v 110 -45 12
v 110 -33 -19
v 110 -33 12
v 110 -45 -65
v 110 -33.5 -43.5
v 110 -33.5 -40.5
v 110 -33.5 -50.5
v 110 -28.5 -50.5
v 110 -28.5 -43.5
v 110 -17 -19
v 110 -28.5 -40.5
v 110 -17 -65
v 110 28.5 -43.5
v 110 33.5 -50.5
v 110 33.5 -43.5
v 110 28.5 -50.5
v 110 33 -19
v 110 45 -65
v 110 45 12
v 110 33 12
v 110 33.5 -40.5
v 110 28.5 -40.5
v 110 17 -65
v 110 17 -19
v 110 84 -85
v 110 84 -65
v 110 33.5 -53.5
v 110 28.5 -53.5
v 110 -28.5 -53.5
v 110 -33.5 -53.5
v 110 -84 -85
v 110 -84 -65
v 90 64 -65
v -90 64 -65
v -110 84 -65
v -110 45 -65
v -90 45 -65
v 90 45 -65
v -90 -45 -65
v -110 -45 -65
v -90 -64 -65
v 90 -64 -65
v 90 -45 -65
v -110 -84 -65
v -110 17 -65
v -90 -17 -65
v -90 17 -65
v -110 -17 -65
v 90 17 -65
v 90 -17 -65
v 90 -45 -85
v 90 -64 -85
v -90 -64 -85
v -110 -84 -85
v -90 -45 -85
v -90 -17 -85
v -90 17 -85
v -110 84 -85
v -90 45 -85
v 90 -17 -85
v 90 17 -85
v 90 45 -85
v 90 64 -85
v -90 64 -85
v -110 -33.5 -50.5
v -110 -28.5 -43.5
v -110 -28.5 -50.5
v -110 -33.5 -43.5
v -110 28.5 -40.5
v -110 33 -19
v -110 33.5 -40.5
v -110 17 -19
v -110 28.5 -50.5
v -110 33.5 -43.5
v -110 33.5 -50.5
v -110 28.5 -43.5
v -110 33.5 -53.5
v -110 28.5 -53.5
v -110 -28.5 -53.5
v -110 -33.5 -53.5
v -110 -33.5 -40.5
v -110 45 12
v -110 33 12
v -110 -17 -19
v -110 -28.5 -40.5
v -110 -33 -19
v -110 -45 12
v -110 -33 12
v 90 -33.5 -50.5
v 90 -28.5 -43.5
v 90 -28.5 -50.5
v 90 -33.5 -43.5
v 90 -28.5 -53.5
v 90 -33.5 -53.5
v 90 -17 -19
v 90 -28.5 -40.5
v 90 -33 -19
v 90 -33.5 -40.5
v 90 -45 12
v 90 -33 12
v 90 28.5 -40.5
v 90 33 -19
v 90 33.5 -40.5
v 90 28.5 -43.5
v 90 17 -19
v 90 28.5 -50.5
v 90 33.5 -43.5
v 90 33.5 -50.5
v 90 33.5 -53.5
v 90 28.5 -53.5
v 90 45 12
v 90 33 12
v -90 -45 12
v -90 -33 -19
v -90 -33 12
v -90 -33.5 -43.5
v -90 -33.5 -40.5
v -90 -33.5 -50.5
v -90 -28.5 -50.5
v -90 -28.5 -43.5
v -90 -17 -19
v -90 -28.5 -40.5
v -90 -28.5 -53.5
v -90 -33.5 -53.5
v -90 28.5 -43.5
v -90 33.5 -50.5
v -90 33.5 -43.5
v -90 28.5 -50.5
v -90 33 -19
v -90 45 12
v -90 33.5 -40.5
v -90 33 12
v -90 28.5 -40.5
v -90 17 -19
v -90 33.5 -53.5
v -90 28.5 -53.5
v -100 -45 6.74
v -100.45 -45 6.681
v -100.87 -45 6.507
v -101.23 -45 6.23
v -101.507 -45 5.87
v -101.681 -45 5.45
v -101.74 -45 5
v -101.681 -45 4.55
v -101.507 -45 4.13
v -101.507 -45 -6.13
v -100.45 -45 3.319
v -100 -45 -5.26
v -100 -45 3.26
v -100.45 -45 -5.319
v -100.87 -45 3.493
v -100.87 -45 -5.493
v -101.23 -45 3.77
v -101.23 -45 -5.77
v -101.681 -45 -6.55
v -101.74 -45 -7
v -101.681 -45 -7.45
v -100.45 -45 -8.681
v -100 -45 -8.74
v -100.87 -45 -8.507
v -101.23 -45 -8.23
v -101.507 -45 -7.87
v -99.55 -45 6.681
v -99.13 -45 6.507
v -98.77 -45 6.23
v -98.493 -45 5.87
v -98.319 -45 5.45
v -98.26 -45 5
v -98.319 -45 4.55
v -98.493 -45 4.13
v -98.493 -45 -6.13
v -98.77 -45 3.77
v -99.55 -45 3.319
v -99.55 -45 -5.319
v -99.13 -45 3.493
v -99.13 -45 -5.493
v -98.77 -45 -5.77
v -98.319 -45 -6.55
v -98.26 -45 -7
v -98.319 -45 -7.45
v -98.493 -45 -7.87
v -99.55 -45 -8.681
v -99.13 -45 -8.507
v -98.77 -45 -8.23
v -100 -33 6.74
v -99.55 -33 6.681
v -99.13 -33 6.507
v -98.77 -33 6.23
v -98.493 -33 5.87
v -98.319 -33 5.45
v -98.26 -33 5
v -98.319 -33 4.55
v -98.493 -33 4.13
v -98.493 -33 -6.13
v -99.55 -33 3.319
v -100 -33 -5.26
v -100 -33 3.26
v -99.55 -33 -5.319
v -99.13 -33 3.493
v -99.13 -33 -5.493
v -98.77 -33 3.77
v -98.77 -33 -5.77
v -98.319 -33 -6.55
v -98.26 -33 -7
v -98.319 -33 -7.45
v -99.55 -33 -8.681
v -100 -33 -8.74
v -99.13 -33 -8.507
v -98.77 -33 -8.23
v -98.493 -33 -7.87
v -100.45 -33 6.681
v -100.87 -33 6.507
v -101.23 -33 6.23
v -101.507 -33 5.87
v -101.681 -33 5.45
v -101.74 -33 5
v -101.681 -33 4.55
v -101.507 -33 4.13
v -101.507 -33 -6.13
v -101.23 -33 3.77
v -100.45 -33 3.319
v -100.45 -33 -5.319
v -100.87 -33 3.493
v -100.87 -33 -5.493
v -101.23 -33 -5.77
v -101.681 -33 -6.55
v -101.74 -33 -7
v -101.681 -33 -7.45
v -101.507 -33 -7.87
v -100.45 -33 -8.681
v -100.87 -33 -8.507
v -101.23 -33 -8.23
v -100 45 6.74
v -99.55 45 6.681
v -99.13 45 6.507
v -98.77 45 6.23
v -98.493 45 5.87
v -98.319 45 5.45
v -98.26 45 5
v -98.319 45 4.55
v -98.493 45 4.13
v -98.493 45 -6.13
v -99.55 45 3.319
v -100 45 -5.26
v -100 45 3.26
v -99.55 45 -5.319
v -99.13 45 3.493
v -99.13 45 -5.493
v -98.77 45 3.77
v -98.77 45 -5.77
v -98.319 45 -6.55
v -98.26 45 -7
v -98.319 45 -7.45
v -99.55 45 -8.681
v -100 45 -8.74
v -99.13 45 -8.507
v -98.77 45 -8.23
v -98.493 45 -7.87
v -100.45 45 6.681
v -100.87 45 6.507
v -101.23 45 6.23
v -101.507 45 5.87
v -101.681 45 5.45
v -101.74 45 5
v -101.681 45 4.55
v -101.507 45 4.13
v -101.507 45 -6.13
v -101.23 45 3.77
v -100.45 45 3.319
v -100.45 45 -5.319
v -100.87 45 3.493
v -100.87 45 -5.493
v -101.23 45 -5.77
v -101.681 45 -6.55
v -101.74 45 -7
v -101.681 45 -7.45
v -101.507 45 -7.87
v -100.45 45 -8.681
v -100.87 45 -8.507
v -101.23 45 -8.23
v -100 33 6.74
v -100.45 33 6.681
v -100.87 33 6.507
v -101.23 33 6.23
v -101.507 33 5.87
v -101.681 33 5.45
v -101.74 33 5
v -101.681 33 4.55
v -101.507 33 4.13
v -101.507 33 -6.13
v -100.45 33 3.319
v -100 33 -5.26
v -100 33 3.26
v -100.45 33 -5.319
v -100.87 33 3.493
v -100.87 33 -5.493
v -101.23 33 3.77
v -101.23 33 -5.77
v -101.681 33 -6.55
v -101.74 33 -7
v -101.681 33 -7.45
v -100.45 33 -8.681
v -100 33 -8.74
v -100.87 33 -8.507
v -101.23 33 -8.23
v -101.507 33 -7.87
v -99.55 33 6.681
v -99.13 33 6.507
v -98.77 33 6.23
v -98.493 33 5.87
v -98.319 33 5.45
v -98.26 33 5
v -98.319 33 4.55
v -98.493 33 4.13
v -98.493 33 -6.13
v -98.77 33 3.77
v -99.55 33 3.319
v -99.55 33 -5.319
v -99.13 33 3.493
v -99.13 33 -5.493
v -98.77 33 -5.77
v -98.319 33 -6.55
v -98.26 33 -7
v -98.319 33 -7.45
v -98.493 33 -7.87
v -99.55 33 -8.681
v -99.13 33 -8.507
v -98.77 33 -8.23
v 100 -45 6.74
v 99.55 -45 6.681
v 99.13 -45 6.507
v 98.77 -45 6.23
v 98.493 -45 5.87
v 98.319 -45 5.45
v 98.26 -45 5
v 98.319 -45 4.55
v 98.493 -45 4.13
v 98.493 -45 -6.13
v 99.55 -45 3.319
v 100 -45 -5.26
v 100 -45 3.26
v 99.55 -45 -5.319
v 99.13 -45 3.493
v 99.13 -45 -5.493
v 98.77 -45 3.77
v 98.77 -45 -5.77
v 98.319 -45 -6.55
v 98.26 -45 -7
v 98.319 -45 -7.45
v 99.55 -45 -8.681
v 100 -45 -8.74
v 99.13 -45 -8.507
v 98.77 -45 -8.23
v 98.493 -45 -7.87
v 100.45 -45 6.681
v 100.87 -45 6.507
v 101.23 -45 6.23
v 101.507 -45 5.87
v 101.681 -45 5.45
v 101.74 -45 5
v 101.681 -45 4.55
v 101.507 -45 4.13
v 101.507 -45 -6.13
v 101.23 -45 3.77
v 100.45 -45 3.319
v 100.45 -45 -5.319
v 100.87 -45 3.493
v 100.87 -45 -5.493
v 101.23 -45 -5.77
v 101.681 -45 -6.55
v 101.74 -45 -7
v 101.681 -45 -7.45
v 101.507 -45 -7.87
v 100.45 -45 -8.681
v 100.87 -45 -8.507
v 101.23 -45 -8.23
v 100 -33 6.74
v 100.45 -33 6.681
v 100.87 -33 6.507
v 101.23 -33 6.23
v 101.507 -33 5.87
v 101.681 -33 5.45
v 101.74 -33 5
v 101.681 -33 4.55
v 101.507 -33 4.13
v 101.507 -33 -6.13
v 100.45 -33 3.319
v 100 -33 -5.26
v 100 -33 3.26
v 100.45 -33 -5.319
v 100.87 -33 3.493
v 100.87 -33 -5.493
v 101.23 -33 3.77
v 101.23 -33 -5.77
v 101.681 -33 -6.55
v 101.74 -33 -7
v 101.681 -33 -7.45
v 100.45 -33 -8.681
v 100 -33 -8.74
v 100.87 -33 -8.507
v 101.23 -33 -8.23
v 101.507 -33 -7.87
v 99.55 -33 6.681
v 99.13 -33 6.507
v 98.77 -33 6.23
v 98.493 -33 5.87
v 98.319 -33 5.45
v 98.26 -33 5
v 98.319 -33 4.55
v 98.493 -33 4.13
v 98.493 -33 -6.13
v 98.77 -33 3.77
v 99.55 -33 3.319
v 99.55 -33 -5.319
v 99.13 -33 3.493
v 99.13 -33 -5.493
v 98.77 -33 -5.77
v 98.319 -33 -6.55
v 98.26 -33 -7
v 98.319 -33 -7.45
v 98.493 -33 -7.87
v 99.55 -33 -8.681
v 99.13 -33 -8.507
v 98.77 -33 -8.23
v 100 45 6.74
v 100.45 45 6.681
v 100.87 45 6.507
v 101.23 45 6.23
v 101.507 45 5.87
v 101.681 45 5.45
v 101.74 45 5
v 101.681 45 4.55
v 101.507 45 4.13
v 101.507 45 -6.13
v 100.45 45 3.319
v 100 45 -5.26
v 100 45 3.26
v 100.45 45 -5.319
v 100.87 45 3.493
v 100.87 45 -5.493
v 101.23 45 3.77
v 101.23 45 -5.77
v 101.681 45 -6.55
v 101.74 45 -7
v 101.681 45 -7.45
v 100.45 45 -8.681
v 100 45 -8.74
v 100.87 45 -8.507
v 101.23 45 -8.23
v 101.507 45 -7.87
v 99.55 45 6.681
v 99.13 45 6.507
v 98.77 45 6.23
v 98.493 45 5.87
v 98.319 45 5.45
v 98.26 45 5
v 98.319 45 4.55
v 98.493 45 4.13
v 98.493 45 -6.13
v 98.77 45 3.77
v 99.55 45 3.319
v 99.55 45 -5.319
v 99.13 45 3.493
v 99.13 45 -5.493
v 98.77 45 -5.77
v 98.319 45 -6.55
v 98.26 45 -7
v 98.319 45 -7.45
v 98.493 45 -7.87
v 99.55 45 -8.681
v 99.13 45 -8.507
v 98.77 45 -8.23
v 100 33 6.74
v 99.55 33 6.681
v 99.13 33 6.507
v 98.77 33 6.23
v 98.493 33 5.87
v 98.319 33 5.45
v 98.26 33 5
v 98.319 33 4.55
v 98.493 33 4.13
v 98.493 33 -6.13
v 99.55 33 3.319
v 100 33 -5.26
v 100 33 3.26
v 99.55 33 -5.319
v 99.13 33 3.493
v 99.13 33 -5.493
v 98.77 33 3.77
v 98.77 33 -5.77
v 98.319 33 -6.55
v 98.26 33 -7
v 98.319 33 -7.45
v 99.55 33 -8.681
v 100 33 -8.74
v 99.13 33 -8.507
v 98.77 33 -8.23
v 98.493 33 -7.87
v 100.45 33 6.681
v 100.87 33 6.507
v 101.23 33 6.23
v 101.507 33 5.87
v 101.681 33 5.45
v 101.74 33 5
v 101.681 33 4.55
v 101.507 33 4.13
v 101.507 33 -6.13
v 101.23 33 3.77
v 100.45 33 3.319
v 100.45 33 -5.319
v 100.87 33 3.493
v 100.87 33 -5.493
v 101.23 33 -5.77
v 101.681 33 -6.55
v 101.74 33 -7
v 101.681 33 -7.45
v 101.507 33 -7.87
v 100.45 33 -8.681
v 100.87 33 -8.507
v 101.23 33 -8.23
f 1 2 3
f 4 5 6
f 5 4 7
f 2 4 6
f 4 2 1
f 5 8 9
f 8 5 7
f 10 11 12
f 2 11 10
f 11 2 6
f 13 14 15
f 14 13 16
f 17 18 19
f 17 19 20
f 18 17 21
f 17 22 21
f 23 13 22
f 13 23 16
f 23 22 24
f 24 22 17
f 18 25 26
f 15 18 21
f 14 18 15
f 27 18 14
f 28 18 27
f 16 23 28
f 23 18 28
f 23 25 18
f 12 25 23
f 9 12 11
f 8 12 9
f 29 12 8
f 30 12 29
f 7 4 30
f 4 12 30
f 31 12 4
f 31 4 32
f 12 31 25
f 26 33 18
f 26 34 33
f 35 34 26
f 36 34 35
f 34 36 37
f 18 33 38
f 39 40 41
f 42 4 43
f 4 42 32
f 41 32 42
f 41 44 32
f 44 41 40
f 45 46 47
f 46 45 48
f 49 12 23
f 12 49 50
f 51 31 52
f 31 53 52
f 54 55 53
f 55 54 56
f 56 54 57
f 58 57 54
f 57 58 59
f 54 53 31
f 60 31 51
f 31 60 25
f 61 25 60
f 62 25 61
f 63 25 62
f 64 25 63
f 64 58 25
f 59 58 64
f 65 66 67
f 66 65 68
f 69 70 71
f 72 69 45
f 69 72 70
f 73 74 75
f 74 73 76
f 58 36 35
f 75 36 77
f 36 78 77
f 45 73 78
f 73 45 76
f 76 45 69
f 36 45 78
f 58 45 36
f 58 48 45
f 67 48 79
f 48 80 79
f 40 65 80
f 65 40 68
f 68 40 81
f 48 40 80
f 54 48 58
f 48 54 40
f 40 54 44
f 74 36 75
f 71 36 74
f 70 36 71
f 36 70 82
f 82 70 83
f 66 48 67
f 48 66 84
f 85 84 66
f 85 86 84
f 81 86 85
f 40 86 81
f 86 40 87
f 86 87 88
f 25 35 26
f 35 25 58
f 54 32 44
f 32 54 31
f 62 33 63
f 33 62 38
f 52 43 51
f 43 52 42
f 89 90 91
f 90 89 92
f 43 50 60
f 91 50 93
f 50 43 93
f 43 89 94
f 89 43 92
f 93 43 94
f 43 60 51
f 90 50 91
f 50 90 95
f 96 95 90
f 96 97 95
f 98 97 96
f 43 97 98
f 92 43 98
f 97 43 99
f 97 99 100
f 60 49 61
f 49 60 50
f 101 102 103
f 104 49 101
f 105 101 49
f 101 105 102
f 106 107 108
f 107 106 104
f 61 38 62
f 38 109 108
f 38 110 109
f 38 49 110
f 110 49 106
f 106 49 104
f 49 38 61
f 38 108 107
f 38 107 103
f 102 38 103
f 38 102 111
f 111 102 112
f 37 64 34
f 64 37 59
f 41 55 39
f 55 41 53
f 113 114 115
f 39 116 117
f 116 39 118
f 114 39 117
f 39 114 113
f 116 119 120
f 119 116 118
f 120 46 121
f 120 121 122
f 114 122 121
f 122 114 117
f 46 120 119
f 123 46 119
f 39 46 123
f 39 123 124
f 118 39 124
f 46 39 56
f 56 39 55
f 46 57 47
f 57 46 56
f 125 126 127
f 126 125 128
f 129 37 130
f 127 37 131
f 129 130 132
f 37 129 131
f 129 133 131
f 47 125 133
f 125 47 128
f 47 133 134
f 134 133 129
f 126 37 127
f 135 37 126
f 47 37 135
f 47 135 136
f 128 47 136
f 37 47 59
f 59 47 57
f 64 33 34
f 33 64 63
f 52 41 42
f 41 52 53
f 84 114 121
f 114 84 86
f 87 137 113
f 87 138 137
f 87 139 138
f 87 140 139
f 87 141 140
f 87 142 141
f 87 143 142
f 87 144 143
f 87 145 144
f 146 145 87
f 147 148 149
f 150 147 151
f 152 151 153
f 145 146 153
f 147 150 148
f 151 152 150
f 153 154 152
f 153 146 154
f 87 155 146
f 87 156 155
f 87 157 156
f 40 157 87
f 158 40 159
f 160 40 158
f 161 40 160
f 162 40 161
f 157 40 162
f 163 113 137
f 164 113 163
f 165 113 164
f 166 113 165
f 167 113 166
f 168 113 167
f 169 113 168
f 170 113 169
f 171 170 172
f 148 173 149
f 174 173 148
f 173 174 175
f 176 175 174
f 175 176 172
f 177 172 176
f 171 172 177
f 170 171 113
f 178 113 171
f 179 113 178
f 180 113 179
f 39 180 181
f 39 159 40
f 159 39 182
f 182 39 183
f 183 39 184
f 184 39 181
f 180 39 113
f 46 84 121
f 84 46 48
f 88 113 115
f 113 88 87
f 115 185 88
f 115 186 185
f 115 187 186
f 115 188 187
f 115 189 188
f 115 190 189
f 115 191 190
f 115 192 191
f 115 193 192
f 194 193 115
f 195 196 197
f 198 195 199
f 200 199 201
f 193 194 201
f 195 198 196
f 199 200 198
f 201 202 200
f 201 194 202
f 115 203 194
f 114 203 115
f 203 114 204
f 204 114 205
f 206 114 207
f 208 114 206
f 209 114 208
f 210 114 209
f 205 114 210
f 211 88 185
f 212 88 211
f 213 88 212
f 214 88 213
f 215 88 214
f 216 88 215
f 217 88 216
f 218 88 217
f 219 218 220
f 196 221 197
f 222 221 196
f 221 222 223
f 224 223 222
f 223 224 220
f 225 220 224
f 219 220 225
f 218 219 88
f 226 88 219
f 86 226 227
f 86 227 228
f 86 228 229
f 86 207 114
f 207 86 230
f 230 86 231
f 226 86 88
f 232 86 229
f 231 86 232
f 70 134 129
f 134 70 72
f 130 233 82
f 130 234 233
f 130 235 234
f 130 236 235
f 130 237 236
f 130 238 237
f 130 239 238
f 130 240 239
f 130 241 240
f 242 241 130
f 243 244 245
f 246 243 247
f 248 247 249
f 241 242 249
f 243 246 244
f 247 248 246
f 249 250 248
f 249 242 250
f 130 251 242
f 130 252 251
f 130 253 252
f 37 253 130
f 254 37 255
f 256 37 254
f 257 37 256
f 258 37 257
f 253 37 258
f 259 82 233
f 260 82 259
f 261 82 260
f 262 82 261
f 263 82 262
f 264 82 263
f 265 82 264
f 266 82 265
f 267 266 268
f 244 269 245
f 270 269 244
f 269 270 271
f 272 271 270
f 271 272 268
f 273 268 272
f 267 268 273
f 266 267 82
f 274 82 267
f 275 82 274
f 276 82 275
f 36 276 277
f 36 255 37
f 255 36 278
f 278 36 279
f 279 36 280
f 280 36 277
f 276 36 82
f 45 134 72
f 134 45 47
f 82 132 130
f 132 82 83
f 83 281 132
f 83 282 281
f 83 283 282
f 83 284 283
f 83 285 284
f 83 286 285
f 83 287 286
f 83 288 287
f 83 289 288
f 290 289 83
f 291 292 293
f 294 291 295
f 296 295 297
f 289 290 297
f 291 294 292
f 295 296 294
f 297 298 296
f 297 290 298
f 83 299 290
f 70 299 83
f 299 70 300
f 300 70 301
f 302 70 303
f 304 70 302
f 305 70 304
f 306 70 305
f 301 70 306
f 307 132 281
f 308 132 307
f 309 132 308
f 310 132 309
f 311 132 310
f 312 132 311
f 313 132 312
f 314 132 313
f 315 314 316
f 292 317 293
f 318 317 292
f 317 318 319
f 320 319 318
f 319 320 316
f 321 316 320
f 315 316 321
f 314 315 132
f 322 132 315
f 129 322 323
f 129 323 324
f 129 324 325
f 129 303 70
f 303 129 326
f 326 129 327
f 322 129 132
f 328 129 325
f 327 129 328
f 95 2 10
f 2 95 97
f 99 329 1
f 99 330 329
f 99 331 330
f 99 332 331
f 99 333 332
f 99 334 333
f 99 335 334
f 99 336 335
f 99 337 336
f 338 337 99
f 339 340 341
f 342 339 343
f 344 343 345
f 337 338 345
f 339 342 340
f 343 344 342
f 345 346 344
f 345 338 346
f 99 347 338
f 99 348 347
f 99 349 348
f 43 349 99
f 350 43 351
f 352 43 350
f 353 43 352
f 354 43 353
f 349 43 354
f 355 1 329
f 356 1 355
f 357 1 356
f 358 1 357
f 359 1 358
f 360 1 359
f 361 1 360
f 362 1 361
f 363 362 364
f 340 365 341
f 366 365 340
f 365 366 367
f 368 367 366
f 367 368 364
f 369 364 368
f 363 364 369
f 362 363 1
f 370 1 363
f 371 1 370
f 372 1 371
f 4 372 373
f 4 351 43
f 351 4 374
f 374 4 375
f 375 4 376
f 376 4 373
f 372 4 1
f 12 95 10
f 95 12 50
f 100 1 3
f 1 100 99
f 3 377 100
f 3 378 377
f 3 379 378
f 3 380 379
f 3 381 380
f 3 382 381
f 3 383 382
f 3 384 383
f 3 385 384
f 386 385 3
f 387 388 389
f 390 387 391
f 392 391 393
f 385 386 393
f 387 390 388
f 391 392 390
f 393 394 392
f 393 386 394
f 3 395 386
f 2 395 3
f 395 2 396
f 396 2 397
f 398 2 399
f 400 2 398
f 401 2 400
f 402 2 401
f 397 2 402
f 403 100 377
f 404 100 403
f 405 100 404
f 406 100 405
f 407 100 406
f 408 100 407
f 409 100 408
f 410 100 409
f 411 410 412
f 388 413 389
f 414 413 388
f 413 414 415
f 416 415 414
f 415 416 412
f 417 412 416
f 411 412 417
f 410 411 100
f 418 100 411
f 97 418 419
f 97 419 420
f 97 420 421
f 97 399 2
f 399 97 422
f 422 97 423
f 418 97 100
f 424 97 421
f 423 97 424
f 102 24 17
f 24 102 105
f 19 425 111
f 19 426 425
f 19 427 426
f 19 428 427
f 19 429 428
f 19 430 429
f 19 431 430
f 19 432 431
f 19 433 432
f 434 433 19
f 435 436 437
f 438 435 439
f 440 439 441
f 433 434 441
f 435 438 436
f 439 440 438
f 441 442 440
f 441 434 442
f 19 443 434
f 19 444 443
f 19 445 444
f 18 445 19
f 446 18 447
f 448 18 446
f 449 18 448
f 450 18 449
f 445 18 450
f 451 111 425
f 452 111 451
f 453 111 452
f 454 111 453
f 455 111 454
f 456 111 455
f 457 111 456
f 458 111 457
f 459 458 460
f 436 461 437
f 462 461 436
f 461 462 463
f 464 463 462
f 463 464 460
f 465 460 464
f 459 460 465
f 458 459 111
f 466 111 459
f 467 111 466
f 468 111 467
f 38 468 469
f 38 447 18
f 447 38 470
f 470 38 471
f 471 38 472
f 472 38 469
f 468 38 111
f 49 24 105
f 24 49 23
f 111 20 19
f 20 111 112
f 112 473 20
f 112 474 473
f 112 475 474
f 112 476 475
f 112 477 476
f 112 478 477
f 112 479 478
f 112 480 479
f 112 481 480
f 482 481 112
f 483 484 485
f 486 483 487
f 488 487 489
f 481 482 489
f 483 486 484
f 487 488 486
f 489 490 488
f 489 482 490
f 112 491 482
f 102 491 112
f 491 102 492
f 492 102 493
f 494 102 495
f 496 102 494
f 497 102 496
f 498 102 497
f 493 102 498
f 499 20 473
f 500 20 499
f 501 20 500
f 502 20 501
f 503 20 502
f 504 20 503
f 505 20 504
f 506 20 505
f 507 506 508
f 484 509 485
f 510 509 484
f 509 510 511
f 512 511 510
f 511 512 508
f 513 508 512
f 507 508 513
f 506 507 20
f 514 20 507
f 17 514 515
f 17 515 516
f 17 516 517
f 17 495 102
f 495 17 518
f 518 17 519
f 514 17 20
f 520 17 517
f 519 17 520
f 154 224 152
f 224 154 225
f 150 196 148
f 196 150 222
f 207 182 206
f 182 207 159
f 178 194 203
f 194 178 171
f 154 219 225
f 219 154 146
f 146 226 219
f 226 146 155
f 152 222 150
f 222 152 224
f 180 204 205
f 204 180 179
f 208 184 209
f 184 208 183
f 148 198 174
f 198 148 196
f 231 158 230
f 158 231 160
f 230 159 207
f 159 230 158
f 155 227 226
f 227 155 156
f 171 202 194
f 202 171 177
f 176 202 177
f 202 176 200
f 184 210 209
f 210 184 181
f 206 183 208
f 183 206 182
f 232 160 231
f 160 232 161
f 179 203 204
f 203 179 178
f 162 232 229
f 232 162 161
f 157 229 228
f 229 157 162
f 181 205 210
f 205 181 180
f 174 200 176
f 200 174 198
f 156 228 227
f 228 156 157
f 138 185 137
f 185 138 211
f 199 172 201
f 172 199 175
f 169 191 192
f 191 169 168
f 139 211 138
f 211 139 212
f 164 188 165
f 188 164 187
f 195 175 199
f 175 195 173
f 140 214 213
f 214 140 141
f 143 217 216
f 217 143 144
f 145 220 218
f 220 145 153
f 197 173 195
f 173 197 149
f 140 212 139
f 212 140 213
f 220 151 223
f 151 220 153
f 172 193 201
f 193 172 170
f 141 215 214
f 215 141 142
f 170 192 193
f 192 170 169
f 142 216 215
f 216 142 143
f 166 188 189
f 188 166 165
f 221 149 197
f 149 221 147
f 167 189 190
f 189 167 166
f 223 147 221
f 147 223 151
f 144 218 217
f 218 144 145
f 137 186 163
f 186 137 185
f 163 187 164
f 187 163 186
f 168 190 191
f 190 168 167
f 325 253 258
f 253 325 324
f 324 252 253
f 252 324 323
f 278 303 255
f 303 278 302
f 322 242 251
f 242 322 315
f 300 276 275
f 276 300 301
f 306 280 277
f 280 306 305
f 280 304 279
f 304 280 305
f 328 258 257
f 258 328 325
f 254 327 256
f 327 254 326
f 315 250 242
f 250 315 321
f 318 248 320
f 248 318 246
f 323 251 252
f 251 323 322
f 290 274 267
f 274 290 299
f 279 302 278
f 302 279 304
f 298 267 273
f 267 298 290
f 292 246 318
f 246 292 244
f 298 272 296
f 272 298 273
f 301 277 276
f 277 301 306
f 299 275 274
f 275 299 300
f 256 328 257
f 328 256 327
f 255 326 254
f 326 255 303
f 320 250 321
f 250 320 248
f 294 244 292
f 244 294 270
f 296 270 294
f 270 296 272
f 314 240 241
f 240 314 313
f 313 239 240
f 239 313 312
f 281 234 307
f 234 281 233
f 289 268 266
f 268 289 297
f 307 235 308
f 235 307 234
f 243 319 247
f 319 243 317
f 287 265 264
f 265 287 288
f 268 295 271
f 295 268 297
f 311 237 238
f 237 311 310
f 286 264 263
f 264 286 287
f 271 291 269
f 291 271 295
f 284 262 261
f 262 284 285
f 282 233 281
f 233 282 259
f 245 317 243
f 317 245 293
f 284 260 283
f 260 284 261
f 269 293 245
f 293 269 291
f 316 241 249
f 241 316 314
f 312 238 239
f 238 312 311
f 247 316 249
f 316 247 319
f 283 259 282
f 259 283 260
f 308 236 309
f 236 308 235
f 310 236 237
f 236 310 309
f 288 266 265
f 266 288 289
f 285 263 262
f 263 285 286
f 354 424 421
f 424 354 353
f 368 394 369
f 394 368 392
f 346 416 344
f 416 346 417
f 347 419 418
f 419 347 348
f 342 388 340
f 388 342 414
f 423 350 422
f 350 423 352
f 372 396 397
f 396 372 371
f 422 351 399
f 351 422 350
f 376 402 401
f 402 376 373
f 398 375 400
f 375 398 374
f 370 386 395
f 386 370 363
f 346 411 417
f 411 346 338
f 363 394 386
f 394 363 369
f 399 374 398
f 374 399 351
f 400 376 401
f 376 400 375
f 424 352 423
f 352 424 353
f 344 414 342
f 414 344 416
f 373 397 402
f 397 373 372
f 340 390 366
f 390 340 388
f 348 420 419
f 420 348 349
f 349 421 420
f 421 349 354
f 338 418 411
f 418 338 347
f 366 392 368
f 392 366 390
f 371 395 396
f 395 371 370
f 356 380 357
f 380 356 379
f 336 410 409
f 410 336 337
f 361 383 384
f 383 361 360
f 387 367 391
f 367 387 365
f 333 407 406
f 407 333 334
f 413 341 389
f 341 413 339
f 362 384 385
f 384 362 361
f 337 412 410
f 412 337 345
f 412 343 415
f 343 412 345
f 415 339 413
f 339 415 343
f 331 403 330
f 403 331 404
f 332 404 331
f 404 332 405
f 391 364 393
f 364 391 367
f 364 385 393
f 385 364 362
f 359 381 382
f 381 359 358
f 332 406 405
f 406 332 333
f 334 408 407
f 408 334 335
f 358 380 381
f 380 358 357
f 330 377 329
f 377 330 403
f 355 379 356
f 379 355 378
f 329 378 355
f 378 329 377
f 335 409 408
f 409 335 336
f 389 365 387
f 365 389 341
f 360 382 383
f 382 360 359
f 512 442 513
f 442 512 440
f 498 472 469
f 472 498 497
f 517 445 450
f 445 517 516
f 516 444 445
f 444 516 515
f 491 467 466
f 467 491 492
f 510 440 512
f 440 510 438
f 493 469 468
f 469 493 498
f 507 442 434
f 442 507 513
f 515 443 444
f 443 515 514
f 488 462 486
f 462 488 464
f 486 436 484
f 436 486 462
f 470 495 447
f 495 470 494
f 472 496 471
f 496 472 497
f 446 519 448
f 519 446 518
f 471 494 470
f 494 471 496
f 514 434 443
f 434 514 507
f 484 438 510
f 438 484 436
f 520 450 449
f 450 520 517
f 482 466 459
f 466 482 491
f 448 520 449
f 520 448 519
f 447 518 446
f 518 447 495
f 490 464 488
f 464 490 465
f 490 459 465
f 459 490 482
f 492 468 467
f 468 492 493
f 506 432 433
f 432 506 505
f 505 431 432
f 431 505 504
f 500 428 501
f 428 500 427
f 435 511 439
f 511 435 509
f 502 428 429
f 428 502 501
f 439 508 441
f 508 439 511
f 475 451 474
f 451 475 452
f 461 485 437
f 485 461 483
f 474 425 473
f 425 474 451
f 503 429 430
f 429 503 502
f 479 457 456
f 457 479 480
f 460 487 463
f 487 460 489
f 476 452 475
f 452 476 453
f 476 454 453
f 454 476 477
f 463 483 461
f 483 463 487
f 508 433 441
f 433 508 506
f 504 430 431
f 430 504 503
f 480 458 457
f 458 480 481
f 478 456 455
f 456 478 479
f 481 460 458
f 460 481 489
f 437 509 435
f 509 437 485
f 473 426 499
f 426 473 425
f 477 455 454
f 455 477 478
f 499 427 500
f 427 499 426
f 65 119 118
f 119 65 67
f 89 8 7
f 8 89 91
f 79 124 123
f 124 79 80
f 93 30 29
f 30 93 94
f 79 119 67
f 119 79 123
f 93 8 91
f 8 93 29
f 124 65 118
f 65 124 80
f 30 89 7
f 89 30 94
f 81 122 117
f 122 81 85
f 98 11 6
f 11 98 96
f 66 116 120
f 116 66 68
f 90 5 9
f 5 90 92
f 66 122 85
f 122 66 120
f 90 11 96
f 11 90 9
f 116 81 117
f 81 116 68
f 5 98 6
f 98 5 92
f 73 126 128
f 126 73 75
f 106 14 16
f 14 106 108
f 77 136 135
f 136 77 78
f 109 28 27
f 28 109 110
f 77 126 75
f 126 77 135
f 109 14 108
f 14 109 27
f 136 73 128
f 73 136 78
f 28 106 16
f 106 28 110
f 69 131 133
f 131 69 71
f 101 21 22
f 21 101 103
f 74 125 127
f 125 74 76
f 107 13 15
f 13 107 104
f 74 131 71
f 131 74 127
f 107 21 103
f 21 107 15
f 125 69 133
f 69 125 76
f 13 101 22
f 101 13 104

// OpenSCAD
// Guard with four supporting shoulders and eight exposed M3 through bolts.
// Print bottom ring on bed, +Z up. Ream horizontal M3 holes after printing.
include <../../../../../scad/lib/child_simple_frame.scad>
child_simple_guard();
